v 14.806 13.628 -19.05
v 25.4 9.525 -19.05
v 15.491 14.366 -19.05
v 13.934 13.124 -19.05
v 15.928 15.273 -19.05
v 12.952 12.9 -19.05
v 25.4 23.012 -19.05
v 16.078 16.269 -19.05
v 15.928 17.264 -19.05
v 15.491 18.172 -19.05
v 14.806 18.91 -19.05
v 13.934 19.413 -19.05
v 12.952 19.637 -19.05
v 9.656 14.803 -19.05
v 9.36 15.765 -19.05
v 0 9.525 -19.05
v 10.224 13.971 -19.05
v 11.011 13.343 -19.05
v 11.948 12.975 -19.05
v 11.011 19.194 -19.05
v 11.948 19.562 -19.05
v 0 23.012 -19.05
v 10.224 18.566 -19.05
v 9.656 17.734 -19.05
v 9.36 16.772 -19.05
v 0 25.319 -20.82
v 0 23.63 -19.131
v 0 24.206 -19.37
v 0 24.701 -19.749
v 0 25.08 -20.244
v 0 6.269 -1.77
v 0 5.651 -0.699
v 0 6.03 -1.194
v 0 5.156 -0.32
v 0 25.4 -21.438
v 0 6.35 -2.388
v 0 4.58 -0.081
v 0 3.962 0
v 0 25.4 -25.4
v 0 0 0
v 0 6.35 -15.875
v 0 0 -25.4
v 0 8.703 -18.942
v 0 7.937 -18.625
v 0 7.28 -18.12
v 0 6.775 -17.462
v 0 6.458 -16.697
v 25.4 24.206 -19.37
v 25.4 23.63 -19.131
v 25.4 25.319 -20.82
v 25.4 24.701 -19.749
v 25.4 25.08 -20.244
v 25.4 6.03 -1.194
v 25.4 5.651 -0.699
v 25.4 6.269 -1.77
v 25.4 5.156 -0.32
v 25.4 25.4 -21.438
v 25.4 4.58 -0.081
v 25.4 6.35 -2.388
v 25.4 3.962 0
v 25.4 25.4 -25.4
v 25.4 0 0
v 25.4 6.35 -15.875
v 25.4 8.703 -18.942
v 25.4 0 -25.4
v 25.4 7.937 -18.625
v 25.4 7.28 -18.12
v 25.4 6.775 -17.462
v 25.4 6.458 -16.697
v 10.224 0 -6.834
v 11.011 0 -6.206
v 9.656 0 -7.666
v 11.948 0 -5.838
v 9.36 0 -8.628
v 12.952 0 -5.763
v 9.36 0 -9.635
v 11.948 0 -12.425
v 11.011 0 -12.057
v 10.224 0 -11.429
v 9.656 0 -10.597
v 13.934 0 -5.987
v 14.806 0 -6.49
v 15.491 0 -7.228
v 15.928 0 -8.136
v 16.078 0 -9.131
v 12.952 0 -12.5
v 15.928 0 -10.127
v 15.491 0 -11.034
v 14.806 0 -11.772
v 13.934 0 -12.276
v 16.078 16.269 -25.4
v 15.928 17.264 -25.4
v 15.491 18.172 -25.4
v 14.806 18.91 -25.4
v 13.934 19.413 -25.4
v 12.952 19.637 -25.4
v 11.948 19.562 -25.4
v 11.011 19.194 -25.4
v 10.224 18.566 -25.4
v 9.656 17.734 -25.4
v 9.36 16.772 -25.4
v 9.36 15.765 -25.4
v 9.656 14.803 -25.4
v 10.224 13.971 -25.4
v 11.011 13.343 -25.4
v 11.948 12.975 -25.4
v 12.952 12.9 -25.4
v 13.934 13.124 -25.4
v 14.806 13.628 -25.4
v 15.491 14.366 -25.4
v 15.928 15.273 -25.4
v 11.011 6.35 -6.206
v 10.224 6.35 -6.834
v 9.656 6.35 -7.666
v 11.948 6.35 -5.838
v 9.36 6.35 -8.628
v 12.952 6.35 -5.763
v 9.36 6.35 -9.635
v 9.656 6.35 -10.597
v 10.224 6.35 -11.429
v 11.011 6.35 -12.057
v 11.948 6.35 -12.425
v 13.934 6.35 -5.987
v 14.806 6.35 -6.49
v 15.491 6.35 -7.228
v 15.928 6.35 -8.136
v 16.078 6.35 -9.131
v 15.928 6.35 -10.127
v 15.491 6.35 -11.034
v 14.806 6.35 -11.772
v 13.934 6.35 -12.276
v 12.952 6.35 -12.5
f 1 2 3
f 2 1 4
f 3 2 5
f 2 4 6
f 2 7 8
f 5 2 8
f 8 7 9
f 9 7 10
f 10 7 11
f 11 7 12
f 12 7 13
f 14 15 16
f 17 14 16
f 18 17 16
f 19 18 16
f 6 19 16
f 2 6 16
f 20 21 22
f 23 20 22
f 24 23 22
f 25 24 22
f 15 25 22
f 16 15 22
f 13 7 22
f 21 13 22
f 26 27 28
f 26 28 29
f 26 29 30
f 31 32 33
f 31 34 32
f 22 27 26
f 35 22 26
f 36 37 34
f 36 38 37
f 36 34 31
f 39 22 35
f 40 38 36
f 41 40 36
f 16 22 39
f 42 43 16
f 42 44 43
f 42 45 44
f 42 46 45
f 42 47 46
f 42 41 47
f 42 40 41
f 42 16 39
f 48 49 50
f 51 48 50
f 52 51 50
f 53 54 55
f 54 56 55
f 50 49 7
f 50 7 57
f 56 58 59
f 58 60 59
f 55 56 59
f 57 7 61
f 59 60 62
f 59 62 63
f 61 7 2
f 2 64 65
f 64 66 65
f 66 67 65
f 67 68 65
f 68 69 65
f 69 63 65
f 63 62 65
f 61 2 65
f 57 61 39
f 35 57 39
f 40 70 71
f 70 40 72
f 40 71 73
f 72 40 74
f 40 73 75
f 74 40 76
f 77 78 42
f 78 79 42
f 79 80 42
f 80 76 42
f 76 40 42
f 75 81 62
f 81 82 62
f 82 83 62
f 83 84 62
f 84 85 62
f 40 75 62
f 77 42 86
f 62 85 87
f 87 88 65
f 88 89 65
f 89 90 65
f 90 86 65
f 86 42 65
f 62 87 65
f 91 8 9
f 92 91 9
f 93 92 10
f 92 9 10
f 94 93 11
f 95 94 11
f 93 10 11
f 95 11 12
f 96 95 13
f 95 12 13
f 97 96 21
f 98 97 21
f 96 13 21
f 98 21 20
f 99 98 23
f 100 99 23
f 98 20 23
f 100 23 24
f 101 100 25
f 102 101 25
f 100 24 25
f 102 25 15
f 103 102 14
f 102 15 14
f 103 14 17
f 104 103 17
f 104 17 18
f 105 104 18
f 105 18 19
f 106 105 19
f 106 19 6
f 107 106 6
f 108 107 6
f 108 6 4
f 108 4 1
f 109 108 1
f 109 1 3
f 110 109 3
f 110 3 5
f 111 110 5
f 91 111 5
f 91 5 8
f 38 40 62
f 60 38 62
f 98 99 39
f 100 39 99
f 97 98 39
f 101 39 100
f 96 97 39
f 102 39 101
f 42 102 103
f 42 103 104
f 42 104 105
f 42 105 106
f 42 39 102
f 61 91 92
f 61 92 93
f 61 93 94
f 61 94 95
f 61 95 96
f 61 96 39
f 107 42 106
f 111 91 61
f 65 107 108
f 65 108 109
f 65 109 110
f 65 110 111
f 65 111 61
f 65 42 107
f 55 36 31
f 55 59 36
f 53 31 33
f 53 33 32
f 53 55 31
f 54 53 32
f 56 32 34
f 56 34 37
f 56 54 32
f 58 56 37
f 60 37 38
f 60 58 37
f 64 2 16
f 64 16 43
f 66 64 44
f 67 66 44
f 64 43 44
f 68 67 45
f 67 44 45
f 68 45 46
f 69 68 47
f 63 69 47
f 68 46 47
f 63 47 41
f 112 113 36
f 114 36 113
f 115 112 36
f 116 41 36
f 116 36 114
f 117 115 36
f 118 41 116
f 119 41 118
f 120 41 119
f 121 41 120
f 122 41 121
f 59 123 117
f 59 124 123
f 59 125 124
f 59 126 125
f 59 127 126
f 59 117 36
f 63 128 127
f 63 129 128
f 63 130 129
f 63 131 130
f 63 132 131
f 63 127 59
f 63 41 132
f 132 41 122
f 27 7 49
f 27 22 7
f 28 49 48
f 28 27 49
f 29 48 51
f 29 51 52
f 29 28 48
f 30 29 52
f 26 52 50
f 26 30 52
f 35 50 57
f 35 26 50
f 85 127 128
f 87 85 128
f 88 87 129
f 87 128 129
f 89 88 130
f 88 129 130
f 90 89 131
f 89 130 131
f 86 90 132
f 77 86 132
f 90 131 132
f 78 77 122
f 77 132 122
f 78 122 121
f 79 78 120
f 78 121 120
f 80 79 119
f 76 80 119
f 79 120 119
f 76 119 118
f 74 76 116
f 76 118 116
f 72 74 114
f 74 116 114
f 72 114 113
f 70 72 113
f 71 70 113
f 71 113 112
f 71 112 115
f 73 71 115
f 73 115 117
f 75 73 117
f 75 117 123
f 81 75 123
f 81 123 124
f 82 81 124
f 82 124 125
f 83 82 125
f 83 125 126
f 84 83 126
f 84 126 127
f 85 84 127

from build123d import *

# Parameters (mm, degrees)
SKETCH1_W           = 25.4
SKETCH1_H           = 25.4
BOSS_EXTRUDE1_DEPTH = 6.35
SKETCH2_W           = 25.4
SKETCH2_H           = 25.4
BOSS_EXTRUDE2_DEPTH = 6.35
FILLET1_R           = 3.175
FILLET2_R           = 2.3876
SKETCH3_R           = 3.3782
CUT_EXTRUDE1_DEPTH  = 7.35
SKETCH4_R           = 3.3782
CUT_EXTRUDE2_DEPTH  = 7.35


with BuildPart() as part:
    # Sketch1 → Boss-Extrude1 (new body)
    with BuildSketch(Plane(origin=(0, 0, 0), x_dir=(1, 0, 0), z_dir=(0, 1, 0))):
        with Locations((12.7, 12.7)):
            Rectangle(SKETCH1_W, SKETCH1_H)
    extrude(amount=BOSS_EXTRUDE1_DEPTH)

    # Sketch2 → Boss-Extrude2 (add)
    with BuildSketch(Plane(origin=(0, 0, -25.4), x_dir=(-1, 0, 0), z_dir=(0, 0, -1))):
        with Locations((-12.7, 12.7)):
            Rectangle(SKETCH2_W, SKETCH2_H)
    extrude(amount=-BOSS_EXTRUDE2_DEPTH)

    # Fillet1
    fillet1_edges = [part.edges().sort_by_distance(p)[0] for p in [
        (12.7, 6.35, -19.05),
    ]]
    fillet(fillet1_edges, radius=FILLET1_R)

    # Fillet2
    fillet2_edges = [part.edges().sort_by_distance(p)[0] for p in [
        (12.7, 25.4, -19.05),
        (12.7, 6.35, 0),
    ]]
    fillet(fillet2_edges, radius=FILLET2_R)

    # Sketch3 → Cut-Extrude1 (cut, through all)
    with BuildSketch(Plane(origin=(0, 6.35, 0), x_dir=(1, 0, 0), z_dir=(0, 1, 0))):
        with Locations((12.7, 9.1313)):
            Circle(SKETCH3_R)
        with Locations((29.80436, 9.1313)):
            Circle(SKETCH3_R)
        with Locations((46.39564, 9.1313)):
            Circle(SKETCH3_R)
        with Locations((33.500058156, 19.57038717)):
            Circle(SKETCH3_R)
    extrude(amount=-CUT_EXTRUDE1_DEPTH, mode=Mode.SUBTRACT)

    # Sketch4 → Cut-Extrude2 (cut, through all)
    with BuildSketch(Plane.XY.offset(-19.05)):
        with Locations((-37.07384, 16.2687)):
            Circle(SKETCH4_R)
        with Locations((-20.48256, 16.2687)):
            Circle(SKETCH4_R)
        with Locations((-3.89128, 16.2687)):
            Circle(SKETCH4_R)
        with Locations((12.7, 16.2687)):
            Circle(SKETCH4_R)
    extrude(amount=-CUT_EXTRUDE2_DEPTH, mode=Mode.SUBTRACT)


solid = part.part
